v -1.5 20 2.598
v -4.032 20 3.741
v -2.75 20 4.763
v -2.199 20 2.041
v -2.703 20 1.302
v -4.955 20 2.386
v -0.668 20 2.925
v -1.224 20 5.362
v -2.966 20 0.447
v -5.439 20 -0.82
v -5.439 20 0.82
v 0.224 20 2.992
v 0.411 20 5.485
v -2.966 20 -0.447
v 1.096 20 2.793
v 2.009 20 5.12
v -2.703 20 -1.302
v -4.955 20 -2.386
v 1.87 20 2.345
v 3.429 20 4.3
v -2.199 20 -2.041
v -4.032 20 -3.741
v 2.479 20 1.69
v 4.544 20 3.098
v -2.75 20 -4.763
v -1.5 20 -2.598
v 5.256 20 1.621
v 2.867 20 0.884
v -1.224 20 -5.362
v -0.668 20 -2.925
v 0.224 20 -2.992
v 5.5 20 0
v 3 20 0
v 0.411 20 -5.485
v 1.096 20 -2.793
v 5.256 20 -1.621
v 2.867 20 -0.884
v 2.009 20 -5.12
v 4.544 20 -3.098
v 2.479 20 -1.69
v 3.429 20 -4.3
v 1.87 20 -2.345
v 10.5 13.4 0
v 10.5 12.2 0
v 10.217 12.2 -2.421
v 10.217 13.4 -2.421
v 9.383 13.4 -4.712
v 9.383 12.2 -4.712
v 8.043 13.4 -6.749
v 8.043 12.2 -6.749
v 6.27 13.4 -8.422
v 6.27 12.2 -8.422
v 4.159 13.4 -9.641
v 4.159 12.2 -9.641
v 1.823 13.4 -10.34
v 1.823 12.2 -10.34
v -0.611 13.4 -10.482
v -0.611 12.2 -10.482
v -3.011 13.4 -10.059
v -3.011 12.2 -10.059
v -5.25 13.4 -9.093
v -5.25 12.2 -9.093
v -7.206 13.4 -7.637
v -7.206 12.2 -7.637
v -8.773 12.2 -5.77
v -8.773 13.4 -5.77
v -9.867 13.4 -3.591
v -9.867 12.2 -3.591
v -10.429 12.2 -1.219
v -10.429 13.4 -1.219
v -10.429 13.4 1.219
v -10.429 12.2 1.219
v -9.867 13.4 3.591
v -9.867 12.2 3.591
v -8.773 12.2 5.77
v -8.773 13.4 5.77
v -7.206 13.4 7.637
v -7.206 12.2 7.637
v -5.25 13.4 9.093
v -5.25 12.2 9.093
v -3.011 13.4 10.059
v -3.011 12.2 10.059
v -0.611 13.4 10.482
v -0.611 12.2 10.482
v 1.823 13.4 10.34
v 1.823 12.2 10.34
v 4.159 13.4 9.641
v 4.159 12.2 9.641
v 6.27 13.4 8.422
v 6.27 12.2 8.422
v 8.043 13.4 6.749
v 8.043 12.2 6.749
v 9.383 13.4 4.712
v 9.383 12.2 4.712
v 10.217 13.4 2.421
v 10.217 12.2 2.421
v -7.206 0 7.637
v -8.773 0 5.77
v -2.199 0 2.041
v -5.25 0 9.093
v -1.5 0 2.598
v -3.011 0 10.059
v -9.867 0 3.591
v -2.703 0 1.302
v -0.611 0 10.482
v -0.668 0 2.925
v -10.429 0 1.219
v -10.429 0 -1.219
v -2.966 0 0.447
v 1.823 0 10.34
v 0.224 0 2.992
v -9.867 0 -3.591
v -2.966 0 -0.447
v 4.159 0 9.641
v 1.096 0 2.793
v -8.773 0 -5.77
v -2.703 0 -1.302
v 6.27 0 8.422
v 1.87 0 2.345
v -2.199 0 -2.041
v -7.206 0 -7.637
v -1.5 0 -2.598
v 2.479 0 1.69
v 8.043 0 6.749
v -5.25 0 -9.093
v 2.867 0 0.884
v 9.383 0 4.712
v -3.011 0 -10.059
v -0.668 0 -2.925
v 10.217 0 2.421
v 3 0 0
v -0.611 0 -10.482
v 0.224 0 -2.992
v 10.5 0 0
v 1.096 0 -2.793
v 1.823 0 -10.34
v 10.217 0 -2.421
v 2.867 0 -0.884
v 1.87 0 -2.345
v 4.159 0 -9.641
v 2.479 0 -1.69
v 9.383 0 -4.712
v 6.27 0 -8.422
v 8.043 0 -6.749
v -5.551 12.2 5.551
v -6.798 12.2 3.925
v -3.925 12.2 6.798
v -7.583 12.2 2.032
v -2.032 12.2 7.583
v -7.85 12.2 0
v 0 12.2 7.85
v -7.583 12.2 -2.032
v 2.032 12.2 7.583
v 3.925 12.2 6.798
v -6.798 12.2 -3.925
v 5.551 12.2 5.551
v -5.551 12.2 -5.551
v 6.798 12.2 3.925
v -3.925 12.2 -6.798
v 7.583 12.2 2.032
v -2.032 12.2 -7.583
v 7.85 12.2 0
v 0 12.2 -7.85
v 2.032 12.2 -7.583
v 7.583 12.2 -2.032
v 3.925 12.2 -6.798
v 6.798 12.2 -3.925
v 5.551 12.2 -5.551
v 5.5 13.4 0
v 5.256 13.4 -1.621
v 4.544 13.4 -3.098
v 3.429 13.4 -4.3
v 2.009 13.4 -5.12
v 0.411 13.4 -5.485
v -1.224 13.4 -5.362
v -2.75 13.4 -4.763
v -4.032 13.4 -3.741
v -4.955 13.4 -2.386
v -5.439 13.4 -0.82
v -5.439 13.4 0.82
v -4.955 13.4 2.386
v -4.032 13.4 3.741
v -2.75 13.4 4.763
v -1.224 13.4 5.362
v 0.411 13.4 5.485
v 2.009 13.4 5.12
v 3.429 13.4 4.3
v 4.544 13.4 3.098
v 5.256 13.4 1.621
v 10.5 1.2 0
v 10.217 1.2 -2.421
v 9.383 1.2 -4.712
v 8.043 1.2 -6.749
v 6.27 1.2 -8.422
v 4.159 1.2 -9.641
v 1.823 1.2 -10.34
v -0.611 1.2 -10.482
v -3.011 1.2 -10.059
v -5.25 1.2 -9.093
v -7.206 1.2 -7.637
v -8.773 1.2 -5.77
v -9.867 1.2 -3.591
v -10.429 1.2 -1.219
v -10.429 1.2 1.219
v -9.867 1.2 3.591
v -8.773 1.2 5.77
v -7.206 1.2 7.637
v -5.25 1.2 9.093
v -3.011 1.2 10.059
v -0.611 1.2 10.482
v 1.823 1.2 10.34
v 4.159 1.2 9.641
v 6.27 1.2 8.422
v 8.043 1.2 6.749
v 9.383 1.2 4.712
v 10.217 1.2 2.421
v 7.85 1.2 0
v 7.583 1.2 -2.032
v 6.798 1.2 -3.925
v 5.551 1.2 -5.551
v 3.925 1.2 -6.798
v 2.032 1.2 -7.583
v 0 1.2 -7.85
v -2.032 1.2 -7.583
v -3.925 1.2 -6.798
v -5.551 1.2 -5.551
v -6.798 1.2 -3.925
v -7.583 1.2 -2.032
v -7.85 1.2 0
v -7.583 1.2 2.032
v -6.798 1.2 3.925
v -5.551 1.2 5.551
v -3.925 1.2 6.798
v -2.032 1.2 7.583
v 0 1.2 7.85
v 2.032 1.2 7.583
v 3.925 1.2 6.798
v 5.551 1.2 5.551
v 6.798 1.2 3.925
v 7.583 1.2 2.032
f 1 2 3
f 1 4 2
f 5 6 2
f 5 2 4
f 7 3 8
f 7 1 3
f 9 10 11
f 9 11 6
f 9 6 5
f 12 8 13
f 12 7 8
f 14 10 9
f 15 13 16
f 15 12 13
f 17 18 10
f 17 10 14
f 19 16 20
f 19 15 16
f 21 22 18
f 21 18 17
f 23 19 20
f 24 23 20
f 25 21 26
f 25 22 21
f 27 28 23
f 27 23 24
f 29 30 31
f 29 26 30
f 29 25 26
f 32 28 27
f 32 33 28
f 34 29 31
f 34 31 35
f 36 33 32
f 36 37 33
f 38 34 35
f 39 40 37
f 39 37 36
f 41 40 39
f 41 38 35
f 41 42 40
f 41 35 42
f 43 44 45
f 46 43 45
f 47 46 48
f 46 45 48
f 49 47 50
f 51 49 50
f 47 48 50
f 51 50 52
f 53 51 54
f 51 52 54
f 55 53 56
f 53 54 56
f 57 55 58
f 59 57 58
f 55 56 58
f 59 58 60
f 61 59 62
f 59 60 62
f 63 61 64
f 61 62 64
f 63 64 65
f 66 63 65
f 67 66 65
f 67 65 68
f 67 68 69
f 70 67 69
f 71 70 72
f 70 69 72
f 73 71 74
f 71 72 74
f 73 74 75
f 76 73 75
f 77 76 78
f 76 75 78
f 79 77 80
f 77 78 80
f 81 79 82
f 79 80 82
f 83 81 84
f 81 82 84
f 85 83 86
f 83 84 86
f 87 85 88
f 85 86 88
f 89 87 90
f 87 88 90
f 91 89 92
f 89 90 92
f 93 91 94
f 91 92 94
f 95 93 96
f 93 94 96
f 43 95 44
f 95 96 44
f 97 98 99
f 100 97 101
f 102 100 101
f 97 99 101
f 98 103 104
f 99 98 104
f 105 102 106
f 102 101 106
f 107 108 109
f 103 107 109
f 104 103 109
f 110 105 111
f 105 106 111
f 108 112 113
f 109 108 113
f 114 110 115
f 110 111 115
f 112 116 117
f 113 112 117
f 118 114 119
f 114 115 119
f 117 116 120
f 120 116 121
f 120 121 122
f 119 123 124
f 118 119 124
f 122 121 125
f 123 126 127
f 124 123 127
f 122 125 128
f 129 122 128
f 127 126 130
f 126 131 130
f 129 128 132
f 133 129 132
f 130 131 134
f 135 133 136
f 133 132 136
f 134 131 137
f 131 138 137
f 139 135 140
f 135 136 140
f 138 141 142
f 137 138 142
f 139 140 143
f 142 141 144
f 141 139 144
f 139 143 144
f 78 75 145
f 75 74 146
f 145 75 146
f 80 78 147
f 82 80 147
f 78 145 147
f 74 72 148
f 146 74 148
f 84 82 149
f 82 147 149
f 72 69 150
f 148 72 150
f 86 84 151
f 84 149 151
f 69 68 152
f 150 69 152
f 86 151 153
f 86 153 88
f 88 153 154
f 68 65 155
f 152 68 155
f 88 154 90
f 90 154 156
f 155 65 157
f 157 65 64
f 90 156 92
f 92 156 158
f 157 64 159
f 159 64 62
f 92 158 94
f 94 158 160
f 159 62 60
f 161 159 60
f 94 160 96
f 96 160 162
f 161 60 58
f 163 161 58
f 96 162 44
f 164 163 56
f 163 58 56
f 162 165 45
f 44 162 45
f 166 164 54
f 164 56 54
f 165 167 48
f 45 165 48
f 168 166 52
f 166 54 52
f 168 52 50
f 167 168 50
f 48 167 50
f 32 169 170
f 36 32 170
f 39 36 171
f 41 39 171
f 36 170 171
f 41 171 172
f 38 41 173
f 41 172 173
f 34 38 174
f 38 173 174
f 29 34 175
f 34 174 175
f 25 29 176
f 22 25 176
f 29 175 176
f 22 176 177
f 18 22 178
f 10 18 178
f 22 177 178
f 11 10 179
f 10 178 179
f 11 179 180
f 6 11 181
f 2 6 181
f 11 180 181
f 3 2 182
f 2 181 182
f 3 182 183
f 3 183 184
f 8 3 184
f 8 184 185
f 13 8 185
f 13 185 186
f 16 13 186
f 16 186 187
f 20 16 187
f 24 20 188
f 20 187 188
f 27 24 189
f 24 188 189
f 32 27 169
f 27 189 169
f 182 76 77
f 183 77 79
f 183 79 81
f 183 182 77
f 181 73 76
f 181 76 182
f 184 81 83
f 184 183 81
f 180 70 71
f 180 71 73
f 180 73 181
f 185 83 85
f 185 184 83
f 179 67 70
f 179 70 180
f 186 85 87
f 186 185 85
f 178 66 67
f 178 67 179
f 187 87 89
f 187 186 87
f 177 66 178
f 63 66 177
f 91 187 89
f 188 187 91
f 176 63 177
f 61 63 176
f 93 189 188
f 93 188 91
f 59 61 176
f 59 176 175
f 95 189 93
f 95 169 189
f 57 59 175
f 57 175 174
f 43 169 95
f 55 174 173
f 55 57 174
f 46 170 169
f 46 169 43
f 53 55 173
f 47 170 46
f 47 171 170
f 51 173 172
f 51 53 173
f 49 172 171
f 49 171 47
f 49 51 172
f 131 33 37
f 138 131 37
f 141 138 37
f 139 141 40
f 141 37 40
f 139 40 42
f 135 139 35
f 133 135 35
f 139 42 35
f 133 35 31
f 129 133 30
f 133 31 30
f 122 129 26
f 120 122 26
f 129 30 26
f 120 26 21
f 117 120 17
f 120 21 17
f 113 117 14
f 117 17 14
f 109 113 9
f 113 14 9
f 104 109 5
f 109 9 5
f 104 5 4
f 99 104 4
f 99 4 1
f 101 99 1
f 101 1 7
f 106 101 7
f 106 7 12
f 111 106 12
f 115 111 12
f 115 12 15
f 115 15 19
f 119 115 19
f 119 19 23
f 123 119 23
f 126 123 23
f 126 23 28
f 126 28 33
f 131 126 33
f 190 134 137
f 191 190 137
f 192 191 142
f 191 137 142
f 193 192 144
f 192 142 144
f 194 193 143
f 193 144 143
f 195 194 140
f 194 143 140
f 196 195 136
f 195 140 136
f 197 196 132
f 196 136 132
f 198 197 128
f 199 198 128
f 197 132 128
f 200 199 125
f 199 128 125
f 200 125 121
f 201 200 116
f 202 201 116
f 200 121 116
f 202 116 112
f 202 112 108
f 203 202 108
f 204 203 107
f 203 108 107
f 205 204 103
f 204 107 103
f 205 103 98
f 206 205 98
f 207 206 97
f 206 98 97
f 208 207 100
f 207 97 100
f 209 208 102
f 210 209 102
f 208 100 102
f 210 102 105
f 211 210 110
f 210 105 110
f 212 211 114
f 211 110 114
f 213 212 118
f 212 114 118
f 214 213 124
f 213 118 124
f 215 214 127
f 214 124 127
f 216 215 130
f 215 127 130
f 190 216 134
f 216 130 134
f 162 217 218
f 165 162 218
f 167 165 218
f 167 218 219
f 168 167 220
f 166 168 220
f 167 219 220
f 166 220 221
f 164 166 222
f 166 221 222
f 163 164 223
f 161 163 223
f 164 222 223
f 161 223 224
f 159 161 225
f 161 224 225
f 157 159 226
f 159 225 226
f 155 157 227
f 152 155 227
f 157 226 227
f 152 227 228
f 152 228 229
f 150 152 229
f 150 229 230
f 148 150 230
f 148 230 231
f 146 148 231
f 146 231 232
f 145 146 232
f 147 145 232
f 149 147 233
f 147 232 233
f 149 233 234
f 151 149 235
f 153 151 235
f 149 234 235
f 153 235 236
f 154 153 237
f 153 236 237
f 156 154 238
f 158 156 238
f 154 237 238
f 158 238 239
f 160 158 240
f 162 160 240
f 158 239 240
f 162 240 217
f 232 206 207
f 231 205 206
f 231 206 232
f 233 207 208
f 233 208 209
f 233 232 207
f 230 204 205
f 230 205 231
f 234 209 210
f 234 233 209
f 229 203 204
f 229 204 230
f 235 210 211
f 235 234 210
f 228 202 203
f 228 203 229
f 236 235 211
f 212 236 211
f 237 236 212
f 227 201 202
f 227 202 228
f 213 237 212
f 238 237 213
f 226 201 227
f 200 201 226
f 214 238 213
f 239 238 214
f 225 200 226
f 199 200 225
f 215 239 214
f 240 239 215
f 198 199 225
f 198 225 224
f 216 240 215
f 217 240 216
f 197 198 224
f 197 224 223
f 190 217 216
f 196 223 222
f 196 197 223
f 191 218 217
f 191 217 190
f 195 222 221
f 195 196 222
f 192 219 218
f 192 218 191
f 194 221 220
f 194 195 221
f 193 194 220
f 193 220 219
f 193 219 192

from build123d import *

# Parameters (mm, degrees)
SKETCH1_R           = 10.5
BOSS_EXTRUDE1_DEPTH = 1.2
SKETCH2_R           = 7.85
BOSS_EXTRUDE2_DEPTH = 11
SKETCH3_R           = 10.5
BOSS_EXTRUDE3_DEPTH = 1.2
SKETCH4_R           = 5.5
BOSS_EXTRUDE4_DEPTH = 6.6
SKETCH5_R           = 3
CUT_EXTRUDE1_DEPTH  = 21


with BuildPart() as part:
    # Sketch1 → Boss-Extrude1 (new body)
    with BuildSketch(Plane(origin=(0, 0, 0), x_dir=(1, 0, 0), z_dir=(0, 1, 0))):
        Circle(SKETCH1_R)
    extrude(amount=BOSS_EXTRUDE1_DEPTH)

    # Sketch2 → Boss-Extrude2 (add)
    with BuildSketch(Plane(origin=(0, 1.2, 0), x_dir=(1, 0, 0), z_dir=(0, 1, 0))):
        Circle(SKETCH2_R)
    extrude(amount=BOSS_EXTRUDE2_DEPTH)

    # Sketch3 → Boss-Extrude3 (add)
    with BuildSketch(Plane(origin=(0, 12.2, 0), x_dir=(1, 0, 0), z_dir=(0, 1, 0))):
        Circle(SKETCH3_R)
    extrude(amount=BOSS_EXTRUDE3_DEPTH)

    # Sketch4 → Boss-Extrude4 (add)
    with BuildSketch(Plane(origin=(0, 13.4, 0), x_dir=(1, 0, 0), z_dir=(0, 1, 0))):
        Circle(SKETCH4_R)
    extrude(amount=BOSS_EXTRUDE4_DEPTH)

    # Sketch5 → Cut-Extrude1 (cut, through all)
    with BuildSketch(Plane(origin=(0, 20, 0), x_dir=(1, 0, 0), z_dir=(0, 1, 0))):
        Circle(SKETCH5_R)
    extrude(amount=-CUT_EXTRUDE1_DEPTH, mode=Mode.SUBTRACT)


solid = part.part
